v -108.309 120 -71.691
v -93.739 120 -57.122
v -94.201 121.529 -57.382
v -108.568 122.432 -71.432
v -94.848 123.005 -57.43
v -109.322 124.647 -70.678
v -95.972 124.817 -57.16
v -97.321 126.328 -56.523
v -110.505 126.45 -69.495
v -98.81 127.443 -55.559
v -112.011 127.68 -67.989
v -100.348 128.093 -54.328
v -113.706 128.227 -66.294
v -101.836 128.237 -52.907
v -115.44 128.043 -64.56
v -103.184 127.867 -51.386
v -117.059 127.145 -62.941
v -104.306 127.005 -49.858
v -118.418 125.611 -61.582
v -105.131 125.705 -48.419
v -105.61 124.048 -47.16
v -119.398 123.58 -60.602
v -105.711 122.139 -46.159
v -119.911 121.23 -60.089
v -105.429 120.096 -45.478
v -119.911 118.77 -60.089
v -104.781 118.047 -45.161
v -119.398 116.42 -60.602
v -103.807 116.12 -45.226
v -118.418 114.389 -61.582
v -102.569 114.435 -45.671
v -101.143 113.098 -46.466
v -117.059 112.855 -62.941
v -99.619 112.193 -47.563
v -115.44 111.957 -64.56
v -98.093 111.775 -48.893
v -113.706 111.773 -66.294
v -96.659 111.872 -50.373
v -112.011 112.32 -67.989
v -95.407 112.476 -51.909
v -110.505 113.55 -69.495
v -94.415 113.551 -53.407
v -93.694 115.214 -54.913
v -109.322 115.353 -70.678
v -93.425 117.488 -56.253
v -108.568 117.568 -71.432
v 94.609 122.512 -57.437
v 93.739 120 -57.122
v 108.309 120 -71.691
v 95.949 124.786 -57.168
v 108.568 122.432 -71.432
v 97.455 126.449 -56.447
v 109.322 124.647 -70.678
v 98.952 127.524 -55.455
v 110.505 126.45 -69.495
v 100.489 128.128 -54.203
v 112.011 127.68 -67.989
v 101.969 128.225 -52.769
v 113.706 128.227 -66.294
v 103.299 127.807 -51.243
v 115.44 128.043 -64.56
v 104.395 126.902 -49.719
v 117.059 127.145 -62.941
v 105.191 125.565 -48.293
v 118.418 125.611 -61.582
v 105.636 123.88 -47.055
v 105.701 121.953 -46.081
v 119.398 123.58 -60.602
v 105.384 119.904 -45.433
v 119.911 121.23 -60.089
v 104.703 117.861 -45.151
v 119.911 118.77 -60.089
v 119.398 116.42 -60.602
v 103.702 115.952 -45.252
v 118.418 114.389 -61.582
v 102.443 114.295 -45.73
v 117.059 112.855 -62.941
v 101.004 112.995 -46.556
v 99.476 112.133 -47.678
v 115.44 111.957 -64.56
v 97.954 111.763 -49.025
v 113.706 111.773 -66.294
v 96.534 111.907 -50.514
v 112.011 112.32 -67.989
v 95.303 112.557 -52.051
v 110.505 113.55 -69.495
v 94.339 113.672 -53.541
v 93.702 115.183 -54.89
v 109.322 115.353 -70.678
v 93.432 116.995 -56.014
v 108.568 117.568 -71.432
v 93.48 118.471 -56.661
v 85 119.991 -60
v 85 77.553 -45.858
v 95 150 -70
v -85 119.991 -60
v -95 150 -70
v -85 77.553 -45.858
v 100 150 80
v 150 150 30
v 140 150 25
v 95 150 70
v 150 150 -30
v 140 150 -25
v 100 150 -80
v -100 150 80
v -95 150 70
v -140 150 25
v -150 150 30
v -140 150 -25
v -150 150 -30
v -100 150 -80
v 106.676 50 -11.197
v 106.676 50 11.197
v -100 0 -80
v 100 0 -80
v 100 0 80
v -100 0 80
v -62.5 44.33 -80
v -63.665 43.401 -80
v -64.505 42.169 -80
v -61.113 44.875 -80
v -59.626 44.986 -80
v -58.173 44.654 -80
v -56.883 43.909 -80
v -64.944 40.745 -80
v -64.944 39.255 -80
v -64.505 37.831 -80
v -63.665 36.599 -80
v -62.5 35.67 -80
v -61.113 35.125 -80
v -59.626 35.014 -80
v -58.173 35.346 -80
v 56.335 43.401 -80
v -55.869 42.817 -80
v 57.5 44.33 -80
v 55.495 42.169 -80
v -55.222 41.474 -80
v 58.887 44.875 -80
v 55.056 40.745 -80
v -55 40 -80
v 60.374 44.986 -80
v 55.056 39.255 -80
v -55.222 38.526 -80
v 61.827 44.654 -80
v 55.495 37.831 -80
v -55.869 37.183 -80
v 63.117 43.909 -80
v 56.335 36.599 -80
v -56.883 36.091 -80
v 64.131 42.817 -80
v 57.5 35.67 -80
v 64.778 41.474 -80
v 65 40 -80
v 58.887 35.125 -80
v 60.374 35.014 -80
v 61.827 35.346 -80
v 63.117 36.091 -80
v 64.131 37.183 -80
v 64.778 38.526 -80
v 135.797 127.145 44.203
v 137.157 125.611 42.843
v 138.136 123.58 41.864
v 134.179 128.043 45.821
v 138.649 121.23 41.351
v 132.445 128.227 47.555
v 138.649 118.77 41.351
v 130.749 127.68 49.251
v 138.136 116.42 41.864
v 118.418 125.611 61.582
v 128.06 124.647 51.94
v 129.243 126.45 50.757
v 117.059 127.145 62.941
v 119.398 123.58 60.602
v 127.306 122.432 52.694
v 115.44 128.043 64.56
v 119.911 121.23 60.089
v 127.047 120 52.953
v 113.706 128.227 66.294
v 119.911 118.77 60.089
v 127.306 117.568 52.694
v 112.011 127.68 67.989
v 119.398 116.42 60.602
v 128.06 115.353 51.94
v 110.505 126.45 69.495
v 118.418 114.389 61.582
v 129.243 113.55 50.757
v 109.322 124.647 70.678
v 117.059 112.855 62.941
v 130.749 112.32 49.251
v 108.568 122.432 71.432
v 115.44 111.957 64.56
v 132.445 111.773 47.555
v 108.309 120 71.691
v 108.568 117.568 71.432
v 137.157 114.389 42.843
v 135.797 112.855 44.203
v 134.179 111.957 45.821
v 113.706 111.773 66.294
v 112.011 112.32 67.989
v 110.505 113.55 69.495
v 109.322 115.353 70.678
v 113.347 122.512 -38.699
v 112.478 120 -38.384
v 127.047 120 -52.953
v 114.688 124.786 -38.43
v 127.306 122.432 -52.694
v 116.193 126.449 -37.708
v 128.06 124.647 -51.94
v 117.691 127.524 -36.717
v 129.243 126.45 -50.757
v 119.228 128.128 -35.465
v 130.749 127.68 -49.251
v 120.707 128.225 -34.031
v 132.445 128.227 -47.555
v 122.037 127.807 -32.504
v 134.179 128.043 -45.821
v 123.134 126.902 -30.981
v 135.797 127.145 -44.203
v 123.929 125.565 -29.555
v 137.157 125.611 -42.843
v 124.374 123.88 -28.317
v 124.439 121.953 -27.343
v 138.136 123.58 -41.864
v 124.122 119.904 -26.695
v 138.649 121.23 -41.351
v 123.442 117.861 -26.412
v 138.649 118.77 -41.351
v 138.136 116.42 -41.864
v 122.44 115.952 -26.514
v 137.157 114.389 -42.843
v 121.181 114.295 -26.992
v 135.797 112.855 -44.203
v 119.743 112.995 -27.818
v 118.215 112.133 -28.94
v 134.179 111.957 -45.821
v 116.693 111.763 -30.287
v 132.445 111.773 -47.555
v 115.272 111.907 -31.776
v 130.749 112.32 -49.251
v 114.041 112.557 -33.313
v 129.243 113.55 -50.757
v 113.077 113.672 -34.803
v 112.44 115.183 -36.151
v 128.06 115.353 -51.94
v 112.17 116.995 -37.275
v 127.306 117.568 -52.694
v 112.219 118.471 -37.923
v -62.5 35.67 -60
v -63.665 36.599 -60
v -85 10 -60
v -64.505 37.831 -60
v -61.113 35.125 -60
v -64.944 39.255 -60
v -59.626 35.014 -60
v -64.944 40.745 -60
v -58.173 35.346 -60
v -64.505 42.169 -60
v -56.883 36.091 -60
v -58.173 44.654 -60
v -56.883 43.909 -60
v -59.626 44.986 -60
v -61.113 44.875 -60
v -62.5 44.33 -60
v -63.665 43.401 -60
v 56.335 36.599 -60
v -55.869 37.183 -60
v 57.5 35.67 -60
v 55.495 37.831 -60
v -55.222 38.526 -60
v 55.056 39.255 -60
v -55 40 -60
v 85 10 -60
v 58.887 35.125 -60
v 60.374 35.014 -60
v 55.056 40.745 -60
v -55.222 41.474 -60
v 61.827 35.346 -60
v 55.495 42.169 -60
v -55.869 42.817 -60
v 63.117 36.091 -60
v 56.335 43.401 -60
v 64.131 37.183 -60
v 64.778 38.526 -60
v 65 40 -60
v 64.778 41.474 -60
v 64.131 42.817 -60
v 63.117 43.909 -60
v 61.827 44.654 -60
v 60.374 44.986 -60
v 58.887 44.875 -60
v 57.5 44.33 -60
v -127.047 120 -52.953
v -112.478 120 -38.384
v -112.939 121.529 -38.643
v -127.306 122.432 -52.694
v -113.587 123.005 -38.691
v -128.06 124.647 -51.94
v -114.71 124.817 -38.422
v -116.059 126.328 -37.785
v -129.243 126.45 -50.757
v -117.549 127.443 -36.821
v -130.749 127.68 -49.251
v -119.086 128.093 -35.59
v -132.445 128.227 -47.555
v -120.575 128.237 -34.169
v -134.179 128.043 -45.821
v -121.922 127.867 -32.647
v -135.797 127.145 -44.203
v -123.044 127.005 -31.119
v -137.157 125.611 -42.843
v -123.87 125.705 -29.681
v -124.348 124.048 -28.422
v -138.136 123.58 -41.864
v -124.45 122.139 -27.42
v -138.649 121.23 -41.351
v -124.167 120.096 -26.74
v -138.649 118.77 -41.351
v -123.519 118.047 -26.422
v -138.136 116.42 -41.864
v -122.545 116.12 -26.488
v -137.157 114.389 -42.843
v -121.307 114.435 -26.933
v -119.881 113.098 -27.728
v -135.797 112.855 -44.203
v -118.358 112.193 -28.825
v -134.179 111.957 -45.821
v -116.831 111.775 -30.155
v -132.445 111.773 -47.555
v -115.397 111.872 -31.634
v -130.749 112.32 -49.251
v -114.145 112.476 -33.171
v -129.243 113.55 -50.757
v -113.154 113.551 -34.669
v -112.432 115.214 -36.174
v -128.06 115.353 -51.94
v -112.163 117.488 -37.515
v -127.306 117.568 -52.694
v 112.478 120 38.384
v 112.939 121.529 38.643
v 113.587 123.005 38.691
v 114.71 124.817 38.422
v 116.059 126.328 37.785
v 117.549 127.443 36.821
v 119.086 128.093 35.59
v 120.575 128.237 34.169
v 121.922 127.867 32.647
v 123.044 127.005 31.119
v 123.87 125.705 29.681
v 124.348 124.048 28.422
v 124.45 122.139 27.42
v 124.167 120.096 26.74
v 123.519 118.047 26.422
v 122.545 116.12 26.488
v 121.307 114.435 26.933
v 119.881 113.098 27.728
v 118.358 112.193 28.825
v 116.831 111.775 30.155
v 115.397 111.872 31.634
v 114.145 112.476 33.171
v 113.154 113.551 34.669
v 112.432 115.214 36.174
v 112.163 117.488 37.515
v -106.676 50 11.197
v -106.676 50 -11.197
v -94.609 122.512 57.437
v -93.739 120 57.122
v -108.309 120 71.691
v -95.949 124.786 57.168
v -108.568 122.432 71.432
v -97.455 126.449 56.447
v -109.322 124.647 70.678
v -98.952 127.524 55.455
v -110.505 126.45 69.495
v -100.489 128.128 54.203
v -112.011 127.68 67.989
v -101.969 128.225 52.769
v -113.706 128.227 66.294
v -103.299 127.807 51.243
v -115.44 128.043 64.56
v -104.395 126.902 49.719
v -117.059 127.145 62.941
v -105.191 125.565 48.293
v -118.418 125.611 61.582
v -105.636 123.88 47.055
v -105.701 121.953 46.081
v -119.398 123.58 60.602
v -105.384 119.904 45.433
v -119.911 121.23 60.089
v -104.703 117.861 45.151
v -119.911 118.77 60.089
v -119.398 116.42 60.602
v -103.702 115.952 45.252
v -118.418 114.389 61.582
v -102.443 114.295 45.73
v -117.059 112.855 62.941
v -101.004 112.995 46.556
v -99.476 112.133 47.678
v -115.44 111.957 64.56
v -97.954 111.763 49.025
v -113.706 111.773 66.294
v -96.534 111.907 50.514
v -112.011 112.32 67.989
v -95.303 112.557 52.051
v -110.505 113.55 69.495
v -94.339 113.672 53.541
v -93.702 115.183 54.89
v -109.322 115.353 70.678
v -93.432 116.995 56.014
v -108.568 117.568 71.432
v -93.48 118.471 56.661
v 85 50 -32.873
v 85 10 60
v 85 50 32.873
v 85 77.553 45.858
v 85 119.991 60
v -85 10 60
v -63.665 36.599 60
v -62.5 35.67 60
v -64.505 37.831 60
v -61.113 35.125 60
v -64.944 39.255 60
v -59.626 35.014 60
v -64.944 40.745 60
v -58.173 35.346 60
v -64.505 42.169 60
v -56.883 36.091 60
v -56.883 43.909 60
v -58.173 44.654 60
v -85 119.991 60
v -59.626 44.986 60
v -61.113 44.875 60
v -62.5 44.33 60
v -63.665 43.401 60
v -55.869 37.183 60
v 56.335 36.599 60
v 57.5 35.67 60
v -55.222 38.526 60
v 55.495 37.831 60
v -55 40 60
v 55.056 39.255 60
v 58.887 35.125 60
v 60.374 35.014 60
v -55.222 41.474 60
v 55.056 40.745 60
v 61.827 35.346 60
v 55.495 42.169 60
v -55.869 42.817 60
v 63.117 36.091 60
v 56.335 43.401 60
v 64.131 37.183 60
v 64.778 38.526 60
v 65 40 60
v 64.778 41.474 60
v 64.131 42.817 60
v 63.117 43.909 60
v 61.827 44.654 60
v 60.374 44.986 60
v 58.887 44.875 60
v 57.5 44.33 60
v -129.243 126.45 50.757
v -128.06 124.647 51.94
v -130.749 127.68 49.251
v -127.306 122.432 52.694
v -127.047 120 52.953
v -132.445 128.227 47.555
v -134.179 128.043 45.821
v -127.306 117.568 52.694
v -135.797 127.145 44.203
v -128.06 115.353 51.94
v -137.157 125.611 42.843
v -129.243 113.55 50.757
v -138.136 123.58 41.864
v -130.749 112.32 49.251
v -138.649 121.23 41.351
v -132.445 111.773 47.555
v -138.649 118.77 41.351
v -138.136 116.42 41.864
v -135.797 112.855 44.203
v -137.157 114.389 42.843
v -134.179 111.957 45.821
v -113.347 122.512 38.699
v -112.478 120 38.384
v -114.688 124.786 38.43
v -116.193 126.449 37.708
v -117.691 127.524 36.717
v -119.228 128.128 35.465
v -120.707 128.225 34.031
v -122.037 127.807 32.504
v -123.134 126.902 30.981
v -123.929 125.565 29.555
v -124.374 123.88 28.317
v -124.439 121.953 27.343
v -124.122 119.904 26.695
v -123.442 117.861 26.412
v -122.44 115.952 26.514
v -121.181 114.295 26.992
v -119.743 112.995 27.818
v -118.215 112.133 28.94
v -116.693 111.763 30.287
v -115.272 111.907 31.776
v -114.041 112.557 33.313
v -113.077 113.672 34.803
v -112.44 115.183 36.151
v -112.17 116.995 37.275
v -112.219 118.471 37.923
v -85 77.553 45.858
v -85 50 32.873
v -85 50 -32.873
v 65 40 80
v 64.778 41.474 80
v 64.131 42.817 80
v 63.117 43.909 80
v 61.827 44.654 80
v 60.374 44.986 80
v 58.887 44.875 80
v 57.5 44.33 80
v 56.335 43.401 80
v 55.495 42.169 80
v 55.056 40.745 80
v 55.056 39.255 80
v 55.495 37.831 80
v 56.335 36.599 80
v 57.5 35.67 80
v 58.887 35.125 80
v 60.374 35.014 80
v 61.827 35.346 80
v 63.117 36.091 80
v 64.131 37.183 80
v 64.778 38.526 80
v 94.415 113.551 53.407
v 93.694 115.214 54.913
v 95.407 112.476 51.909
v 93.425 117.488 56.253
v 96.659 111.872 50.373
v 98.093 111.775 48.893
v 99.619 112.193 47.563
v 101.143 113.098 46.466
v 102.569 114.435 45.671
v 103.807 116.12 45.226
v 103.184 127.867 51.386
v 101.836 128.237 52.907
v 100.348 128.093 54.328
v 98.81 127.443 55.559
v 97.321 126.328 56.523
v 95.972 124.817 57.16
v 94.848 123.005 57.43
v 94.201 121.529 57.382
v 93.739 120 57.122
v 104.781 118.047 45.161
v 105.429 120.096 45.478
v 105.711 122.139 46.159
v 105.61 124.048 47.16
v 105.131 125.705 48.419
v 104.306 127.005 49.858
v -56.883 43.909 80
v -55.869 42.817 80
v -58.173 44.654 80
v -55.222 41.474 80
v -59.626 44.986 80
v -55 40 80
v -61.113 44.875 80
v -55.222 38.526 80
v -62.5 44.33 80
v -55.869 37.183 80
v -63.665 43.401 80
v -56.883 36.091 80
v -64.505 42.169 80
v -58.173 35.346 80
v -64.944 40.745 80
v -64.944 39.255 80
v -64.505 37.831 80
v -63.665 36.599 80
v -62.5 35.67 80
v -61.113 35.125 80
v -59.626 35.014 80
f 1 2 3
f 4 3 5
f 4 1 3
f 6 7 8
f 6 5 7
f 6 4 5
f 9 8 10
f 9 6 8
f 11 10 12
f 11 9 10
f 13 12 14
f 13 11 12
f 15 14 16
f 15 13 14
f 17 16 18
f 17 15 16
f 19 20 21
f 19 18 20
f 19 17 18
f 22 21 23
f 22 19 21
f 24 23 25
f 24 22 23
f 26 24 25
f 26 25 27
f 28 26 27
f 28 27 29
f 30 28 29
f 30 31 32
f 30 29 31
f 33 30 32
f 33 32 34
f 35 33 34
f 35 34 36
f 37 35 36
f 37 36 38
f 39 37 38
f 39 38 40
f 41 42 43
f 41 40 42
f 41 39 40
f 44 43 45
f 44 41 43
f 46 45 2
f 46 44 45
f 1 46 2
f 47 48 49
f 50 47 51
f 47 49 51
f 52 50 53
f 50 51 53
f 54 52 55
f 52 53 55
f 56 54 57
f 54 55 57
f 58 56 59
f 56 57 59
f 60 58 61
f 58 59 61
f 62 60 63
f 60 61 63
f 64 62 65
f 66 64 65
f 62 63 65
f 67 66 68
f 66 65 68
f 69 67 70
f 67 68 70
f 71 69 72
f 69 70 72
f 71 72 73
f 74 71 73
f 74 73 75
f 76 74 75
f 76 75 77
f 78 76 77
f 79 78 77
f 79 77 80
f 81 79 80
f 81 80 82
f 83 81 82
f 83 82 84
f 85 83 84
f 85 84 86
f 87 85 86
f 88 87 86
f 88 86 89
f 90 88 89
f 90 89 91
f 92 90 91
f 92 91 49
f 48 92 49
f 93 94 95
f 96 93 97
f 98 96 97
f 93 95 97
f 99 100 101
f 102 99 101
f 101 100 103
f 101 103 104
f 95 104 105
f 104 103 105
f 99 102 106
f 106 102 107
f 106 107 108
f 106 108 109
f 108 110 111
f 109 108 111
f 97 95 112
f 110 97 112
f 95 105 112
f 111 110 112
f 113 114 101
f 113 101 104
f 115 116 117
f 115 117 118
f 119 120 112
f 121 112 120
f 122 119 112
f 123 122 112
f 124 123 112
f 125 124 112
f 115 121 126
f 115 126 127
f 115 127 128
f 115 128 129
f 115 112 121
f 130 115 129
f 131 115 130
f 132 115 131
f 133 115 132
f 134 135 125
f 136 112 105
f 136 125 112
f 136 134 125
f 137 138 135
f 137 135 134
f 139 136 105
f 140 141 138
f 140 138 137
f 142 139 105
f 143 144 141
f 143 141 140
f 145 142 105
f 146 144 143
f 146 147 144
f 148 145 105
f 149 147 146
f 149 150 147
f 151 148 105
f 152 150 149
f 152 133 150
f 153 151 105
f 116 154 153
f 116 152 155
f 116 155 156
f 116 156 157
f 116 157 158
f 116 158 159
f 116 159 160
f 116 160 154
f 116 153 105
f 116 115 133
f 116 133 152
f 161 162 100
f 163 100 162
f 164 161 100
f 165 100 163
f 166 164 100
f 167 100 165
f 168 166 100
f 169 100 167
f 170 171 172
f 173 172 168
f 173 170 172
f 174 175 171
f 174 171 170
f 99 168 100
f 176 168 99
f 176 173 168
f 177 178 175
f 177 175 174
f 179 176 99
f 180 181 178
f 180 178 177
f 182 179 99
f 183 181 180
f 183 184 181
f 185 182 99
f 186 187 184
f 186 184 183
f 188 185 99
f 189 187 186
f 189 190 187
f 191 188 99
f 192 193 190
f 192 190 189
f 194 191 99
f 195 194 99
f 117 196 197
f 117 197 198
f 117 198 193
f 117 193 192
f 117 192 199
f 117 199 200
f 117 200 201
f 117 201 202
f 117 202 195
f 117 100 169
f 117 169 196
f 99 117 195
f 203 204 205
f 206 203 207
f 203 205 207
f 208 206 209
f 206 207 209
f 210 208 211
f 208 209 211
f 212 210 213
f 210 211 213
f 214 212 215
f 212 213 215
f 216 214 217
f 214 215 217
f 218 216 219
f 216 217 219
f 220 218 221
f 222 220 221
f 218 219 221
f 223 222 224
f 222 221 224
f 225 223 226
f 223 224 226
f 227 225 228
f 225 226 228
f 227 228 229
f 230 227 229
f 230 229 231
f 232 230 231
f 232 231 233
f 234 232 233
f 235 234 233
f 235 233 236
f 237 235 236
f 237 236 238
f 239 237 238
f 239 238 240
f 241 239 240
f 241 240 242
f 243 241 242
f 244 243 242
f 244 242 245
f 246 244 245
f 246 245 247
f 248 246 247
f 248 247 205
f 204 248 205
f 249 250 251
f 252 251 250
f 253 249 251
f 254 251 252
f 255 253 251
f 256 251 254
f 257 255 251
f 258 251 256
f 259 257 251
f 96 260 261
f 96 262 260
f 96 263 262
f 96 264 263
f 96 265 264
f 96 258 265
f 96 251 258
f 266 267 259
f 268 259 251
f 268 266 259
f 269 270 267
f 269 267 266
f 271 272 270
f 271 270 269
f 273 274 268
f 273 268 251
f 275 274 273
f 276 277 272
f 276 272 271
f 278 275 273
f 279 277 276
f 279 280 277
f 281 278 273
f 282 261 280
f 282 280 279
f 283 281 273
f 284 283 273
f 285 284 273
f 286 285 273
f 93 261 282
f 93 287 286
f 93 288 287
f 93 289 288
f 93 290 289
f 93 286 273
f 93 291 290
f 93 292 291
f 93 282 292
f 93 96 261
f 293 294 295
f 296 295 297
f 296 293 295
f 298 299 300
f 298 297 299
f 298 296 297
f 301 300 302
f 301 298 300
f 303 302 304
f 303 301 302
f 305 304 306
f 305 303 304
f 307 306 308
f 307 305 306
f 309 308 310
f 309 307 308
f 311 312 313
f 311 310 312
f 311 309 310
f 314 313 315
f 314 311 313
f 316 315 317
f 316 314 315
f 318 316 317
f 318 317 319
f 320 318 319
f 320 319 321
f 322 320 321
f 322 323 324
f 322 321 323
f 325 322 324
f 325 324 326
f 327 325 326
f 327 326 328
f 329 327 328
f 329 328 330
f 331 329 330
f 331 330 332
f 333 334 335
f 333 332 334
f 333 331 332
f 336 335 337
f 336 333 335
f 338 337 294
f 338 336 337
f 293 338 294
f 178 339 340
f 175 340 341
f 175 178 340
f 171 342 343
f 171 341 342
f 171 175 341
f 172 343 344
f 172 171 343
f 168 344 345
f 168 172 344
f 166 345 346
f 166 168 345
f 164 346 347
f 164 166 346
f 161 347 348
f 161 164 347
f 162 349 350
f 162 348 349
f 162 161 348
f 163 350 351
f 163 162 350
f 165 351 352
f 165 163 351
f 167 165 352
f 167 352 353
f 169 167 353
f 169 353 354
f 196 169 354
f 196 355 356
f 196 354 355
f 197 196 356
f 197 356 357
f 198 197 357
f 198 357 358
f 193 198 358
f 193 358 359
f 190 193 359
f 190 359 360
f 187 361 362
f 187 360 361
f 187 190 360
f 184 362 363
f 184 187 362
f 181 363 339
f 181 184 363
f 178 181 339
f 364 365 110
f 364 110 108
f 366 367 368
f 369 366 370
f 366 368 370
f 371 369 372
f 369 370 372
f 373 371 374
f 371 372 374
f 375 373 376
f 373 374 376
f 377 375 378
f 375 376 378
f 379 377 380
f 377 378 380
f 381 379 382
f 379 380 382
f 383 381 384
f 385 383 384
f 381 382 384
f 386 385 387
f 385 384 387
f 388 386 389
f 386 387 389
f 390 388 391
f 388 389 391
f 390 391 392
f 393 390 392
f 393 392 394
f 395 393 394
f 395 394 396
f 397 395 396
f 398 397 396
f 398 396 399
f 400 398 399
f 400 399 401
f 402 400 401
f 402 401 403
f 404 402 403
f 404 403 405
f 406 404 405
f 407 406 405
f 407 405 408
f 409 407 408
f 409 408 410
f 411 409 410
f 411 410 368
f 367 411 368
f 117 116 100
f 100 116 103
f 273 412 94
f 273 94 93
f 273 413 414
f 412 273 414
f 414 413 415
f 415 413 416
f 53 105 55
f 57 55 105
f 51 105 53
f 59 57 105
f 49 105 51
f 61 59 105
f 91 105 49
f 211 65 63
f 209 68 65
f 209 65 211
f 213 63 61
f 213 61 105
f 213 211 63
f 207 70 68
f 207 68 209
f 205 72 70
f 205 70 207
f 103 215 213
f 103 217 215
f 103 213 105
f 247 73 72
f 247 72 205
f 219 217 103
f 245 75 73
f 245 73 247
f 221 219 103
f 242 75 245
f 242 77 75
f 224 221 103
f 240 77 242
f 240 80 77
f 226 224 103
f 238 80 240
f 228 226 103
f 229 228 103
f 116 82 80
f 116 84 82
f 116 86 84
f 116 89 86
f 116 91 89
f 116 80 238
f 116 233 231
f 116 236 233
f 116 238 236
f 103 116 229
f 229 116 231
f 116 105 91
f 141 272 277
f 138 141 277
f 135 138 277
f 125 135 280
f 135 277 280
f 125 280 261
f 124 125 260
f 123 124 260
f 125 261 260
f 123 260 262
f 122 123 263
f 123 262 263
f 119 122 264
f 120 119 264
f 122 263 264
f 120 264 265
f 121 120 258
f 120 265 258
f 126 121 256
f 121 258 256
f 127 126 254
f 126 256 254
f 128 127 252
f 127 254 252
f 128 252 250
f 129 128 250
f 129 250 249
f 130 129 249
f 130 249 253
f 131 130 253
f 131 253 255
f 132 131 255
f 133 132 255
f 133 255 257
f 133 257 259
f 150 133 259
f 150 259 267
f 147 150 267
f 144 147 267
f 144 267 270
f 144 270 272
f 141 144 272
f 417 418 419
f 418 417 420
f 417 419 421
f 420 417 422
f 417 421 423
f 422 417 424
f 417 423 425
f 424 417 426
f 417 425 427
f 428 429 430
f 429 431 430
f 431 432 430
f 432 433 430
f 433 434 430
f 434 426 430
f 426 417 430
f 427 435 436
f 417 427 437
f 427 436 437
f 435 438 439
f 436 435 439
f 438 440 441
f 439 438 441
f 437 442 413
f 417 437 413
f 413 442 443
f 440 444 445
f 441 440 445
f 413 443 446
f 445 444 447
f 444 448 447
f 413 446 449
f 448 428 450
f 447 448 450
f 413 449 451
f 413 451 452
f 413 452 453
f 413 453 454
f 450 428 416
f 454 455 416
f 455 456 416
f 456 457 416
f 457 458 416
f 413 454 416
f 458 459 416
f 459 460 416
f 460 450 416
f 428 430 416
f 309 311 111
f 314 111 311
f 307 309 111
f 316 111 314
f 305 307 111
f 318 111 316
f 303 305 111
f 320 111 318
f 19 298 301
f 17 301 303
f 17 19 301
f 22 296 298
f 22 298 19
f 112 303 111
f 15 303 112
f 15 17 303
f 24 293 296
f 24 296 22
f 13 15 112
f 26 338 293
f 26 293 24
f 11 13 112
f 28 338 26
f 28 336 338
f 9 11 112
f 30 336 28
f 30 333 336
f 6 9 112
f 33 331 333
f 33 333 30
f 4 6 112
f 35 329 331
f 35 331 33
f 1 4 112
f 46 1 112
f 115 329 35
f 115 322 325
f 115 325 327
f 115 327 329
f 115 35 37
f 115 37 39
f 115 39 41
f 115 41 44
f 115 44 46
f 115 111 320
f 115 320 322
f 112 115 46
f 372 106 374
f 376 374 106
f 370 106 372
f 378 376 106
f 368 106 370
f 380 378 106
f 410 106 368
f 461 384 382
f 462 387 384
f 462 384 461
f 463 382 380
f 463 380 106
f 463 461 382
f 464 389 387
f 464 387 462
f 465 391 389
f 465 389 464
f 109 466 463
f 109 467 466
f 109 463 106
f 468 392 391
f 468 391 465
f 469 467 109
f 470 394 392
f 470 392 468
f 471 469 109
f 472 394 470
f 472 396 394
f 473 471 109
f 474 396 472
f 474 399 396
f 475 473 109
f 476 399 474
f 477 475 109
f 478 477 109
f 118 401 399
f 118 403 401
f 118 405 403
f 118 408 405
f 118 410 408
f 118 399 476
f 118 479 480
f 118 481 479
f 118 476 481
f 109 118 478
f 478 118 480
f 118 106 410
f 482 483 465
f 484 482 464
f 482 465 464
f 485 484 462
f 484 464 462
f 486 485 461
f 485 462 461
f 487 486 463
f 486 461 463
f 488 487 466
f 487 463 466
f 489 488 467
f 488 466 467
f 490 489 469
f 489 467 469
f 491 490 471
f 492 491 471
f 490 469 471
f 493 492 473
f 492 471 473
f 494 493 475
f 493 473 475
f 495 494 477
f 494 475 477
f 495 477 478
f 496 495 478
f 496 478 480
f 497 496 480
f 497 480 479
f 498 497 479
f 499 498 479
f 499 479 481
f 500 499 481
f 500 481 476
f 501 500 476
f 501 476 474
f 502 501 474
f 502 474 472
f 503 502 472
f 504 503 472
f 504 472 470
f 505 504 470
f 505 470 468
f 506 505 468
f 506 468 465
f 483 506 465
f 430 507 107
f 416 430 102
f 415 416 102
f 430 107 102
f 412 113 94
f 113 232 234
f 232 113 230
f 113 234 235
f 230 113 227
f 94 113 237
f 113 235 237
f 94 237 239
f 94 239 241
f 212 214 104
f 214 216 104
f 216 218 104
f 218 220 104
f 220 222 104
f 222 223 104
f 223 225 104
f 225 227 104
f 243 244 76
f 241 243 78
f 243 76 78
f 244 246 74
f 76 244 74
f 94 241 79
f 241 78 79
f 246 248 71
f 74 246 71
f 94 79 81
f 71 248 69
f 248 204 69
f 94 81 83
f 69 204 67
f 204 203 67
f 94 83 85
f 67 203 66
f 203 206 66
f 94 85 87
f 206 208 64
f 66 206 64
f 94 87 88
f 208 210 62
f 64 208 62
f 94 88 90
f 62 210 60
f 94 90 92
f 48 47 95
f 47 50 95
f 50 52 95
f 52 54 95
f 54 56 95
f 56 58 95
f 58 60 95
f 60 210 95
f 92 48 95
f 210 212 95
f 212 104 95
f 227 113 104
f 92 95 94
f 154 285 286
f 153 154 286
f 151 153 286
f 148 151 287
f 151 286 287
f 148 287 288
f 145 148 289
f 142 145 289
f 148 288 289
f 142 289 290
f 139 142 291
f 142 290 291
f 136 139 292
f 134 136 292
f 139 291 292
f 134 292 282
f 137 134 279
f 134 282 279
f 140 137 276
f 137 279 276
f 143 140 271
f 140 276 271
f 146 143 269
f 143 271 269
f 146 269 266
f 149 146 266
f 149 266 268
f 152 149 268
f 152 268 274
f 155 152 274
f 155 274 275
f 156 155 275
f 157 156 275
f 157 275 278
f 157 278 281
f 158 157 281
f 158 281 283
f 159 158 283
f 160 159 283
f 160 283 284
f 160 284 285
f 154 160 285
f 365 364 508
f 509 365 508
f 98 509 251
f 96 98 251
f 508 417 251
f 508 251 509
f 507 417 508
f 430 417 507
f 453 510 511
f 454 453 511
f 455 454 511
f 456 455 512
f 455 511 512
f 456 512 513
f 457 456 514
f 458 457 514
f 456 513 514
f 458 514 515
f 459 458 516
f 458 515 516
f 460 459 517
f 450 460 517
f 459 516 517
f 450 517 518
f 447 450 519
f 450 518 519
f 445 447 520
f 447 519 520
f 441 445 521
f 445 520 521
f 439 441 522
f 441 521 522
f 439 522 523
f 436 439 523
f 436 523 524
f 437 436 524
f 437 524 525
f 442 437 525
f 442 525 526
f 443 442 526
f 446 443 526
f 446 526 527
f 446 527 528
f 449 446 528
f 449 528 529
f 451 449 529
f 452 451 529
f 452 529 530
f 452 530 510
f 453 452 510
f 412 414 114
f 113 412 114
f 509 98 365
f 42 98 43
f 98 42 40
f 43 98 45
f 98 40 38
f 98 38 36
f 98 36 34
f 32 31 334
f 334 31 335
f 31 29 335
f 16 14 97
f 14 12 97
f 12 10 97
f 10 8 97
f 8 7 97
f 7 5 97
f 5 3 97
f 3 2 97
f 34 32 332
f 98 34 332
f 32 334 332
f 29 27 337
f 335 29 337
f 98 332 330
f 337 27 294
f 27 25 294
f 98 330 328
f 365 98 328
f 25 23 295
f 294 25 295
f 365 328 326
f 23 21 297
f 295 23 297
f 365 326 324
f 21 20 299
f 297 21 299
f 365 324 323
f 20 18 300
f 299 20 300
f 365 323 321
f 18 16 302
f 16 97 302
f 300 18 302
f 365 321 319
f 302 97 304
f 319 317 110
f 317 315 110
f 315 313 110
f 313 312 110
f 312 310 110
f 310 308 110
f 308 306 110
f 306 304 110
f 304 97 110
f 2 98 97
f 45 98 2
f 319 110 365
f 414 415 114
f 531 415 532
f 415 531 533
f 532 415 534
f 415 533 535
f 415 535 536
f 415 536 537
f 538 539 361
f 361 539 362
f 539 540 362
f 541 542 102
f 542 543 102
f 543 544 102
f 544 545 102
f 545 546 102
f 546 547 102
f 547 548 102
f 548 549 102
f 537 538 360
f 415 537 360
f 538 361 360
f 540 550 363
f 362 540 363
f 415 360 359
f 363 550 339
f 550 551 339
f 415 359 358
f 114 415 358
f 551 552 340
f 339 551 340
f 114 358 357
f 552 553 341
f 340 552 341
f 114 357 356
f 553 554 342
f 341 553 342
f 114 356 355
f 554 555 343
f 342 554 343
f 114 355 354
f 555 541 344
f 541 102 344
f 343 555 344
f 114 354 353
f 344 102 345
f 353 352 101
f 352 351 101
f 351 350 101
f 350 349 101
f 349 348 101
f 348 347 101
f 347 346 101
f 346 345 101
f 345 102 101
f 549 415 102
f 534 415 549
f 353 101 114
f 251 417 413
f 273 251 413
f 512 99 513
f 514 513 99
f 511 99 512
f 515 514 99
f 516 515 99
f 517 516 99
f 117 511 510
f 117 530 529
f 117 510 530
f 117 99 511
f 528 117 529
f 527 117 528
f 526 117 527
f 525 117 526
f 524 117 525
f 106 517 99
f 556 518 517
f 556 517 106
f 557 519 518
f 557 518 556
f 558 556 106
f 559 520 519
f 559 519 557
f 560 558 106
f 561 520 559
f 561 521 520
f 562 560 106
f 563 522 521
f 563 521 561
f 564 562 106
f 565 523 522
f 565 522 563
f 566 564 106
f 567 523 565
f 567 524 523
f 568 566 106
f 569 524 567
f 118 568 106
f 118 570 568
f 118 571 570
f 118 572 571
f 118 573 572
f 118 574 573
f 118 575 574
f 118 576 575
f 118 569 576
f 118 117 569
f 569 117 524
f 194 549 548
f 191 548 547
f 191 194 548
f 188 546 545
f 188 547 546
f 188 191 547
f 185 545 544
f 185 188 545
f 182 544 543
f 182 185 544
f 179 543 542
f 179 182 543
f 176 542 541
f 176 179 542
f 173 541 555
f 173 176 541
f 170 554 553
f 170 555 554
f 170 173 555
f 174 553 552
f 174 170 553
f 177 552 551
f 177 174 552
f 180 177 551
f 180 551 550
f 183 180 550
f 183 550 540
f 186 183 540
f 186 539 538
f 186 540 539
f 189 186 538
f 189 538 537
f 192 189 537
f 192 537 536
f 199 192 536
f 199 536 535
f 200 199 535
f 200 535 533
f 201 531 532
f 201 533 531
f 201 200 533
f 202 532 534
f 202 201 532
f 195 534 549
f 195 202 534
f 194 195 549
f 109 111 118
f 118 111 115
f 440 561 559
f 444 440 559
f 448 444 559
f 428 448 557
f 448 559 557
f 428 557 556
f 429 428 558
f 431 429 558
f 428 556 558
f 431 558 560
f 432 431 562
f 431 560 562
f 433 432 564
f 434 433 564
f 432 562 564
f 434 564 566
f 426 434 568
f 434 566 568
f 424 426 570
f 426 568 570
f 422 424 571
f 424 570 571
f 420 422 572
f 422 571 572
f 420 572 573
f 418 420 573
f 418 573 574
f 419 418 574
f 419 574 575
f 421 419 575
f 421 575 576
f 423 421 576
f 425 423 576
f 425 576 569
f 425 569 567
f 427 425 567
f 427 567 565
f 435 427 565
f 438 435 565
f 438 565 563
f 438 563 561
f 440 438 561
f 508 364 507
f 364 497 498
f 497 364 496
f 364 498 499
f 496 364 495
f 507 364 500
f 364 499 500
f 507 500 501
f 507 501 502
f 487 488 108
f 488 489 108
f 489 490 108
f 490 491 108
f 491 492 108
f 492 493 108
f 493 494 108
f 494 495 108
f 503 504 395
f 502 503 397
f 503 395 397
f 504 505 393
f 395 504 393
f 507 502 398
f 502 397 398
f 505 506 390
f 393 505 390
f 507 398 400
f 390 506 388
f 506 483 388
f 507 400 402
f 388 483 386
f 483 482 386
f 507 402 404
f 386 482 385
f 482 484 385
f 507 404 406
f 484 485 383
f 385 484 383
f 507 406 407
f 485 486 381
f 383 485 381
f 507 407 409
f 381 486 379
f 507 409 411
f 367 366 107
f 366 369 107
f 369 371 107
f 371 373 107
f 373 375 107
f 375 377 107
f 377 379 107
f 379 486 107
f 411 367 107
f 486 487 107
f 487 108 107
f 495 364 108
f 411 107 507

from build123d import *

# Parameters (mm, degrees)
BOSS_EXTRUDE1_DEPTH     = 150
CUT_EXTRUDE1_DEPTH      = 227.715680975
CUT_EXTRUDE1_DEPTH_BACK = 227.715680975
SKETCH3_W               = 170
SKETCH3_H               = 190
CUT_EXTRUDE2_DEPTH      = 60
CUT_EXTRUDE3_DEPTH      = 100
CUT_EXTRUDE3_DRAFT      = -18.43
SKETCH5_R               = 8.25
CUT_EXTRUDE4_DEPTH      = 80
MIRROR2_COPY_1_SKETCH_R = 8.25
MIRROR2_COPY_1_DEPTH    = 80
SKETCH7_R               = 5
CUT_EXTRUDE5_DEPTH      = 266.706605112


with BuildPart() as part:
    # Sketch1 → Boss-Extrude1 (new body)
    with BuildSketch(Plane(origin=(0, 0, 0), x_dir=(1, 0, 0), z_dir=(0, 1, 0))):
        Polygon((-150, 30), (-100, 80), (100, 80), (150, 30), (150, -30), (100, -80), (-100, -80), (-150, -30), align=None)
    extrude(amount=BOSS_EXTRUDE1_DEPTH)

    # Sketch2 → Cut-Extrude1 (cut, two sides: drawn at the far end of the back side and taken through both)
    with BuildSketch(Plane.XY.offset(-CUT_EXTRUDE1_DEPTH_BACK)):
        Polygon((-150, 150), (-100, 0), (-150, 0), align=None)
        Polygon((100, 0), (150, 150), (150, 0), align=None)
    extrude(amount=CUT_EXTRUDE1_DEPTH + CUT_EXTRUDE1_DEPTH_BACK, mode=Mode.SUBTRACT)

    # Sketch3 → Cut-Extrude2 (cut, symmetric)
    with BuildSketch(Plane.XY):
        with Locations((0, 105)):
            Rectangle(SKETCH3_W, SKETCH3_H)
    extrude(amount=CUT_EXTRUDE2_DEPTH, both=True, mode=Mode.SUBTRACT)


with BuildPart() as cut_extrude3_tool:
    # Sketch4 → Cut-Extrude3 (with draft: the straight prism first)
    with BuildSketch(Plane(origin=(0, 150, 0), x_dir=(1, 0, 0), z_dir=(0, 1, 0))):
        Polygon((-140, -25), (-125, -40), (-95, -70), (95, -70), (140, -25), (140, 25), (95, 70), (-95, 70), (-140, 25), align=None)
    extrude(amount=-CUT_EXTRUDE3_DEPTH)
    # Cut-Extrude3: the draft: its side faces are tilted about the plane it starts from
    cut_extrude3_sides = [cut_extrude3_tool.faces().sort_by_distance(p)[0] for p in [
        (-117.5, 100, 47.5),
        (-117.5, 100, -47.5),
        (0, 100, -70),
        (117.5, 100, -47.5),
        (140, 100, 0),
        (117.5, 100, 47.5),
        (0, 100, 70),
        (-140, 100, 0),
    ]]
    draft(cut_extrude3_sides, Plane(origin=(0, 150, 0), x_dir=(1, 0, 0), z_dir=(0, 1, 0)), CUT_EXTRUDE3_DRAFT)


with BuildPart() as part_1:
    add(part.part)

    # Cut-Extrude3: cut by cut_extrude3_tool
    add(cut_extrude3_tool.part, mode=Mode.SUBTRACT)

    # Sketch5 → Cut-Extrude4 (cut)
    with BuildSketch(Plane(origin=(-90, 0, 90), x_dir=(0.7071067811865475, 0, 0.7071067811865477), z_dir=(-0.7071067811865477, 0, 0.7071067811865475))):
        with Locations((-60.642135624, 120)):
            Circle(SKETCH5_R)
        with Locations((-34.142135624, 120)):
            Circle(SKETCH5_R)
    cut_extrude4 = extrude(amount=-CUT_EXTRUDE4_DEPTH, mode=Mode.SUBTRACT)

    # Mirror1: Cut-Extrude4 across plane
    add(cut_extrude4.mirror(Plane.XY), mode=Mode.SUBTRACT)

    # Mirror2: Cut-Extrude4 across plane
    add(cut_extrude4.mirror(Plane(origin=(0, 0, 0), x_dir=(0, 0, 1), z_dir=(1, 0, 0))), mode=Mode.SUBTRACT)

    # Mirror2 copy 1 sketch → Mirror2 copy 1 (cut)
    with BuildSketch(Plane(origin=(90, 0, -90), x_dir=(-0.7071067811865475, 0, -0.7071067811865477), z_dir=(0.7071067811865477, 0, -0.7071067811865475))):
        with Locations((-60.642135624, 120)):
            Circle(MIRROR2_COPY_1_SKETCH_R)
        with Locations((-34.142135624, 120)):
            Circle(MIRROR2_COPY_1_SKETCH_R)
    extrude(amount=-MIRROR2_COPY_1_DEPTH, mode=Mode.SUBTRACT)

    # Sketch7 → Cut-Extrude5 (cut, through all)
    with BuildSketch(Plane.XY.offset(80)):
        with Locations((-60, 40)):
            Circle(SKETCH7_R)
        with Locations((60, 40)):
            Circle(SKETCH7_R)
    extrude(amount=-CUT_EXTRUDE5_DEPTH, mode=Mode.SUBTRACT)


solid = part_1.part
